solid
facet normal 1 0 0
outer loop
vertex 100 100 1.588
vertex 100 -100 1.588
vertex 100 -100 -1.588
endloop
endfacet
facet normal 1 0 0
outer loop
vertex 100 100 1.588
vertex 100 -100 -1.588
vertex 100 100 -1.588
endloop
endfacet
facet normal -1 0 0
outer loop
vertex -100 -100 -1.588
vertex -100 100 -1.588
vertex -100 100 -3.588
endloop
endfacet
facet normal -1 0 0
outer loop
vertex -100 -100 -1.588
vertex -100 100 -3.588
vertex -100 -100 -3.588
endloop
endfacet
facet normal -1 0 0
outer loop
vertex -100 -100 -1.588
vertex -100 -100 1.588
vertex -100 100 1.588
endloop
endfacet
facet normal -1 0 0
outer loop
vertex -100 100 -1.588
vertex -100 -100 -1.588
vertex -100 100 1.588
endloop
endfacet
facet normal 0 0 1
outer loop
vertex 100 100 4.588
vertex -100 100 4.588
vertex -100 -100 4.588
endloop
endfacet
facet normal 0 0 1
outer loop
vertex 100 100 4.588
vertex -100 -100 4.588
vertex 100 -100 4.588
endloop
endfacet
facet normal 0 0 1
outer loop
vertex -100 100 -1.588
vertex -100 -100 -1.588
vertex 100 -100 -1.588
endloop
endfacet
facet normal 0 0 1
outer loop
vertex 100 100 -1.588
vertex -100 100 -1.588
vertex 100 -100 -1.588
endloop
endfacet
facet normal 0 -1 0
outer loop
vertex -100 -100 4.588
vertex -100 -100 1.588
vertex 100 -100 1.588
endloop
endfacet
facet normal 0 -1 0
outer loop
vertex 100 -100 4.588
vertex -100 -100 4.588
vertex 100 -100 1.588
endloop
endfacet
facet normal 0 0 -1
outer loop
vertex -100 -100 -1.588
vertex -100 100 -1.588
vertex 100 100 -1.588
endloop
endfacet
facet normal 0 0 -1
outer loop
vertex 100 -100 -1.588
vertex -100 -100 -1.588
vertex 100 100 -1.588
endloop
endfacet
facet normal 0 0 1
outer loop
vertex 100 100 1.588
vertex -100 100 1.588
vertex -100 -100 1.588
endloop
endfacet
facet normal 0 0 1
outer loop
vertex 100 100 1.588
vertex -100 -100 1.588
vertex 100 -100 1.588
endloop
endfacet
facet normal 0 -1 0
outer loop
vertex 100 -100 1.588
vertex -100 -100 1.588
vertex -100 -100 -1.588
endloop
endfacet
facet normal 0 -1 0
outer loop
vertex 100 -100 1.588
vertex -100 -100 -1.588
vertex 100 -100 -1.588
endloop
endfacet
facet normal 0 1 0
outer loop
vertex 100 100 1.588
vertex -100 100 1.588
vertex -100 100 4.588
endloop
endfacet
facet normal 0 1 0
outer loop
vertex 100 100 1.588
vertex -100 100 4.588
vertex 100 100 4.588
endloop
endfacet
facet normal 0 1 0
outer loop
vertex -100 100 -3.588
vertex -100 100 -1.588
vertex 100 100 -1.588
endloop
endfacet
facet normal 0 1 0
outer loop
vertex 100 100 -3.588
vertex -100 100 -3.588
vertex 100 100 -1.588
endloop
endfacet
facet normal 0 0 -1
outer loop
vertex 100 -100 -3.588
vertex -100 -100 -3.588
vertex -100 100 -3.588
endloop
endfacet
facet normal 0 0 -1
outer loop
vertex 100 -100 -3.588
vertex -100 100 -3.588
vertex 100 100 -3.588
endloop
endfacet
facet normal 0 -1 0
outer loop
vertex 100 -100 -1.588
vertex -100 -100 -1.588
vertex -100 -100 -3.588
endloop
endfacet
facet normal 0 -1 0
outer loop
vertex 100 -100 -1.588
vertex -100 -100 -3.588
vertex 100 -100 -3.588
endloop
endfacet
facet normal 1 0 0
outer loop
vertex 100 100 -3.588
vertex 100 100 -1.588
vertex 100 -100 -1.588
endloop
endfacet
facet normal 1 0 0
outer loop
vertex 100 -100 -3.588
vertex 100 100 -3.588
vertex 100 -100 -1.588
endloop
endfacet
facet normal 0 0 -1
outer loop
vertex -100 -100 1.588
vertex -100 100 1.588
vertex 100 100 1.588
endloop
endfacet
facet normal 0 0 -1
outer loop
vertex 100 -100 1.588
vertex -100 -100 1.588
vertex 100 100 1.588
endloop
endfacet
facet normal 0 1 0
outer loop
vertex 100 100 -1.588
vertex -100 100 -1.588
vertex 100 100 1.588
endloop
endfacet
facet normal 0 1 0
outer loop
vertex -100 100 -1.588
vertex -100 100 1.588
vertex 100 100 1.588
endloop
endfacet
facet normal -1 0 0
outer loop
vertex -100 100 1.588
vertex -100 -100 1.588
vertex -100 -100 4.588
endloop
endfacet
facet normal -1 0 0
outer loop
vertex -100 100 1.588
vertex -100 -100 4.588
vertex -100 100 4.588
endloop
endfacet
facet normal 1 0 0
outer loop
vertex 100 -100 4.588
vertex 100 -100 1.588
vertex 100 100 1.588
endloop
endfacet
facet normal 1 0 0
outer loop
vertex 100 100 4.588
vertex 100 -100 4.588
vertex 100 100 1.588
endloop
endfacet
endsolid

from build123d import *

# Parameters (mm, degrees)
F0_W     = 200
F0_H     = 200
F1_DEPTH = 1.5875
F2_R     = 2.5
F3_DEPTH = 3.176
F4_W     = 200
F4_H     = 200
F5_DEPTH = 2
F6_W     = 200
F6_H     = 200
F7_DEPTH = 3


with BuildPart() as f1:
    # F0 (on Top) → F1 (new body, symmetric)
    with BuildSketch(Plane.XY):
        Rectangle(F0_W, F0_H)
    extrude(amount=F1_DEPTH, both=True)

    # F2 (on face) → F3 (cut, through all)
    with BuildSketch(Plane.XY.offset(1.5875)):
        with Locations((-90, -140)):
            Circle(F2_R)
        with Locations((-90, 140)):
            Circle(F2_R)
        with Locations((90, 140)):
            Circle(F2_R)
        with Locations((90, -140)):
            Circle(F2_R)
    extrude(amount=-F3_DEPTH, mode=Mode.SUBTRACT)


with BuildPart() as f5:
    # F4 (on face) → F5 (new body)
    with BuildSketch(Plane(origin=(0, 0, -1.5875), x_dir=(1, 0, 0), z_dir=(0, 0, -1))):
        Rectangle(F4_W, F4_H)
    extrude(amount=F5_DEPTH)


with BuildPart() as f7:
    # F6 (on face) → F7 (new body)
    with BuildSketch(Plane.XY.offset(1.5875)):
        Rectangle(F6_W, F6_H)
    extrude(amount=F7_DEPTH)


solid = Compound([f1.part, f5.part, f7.part])
